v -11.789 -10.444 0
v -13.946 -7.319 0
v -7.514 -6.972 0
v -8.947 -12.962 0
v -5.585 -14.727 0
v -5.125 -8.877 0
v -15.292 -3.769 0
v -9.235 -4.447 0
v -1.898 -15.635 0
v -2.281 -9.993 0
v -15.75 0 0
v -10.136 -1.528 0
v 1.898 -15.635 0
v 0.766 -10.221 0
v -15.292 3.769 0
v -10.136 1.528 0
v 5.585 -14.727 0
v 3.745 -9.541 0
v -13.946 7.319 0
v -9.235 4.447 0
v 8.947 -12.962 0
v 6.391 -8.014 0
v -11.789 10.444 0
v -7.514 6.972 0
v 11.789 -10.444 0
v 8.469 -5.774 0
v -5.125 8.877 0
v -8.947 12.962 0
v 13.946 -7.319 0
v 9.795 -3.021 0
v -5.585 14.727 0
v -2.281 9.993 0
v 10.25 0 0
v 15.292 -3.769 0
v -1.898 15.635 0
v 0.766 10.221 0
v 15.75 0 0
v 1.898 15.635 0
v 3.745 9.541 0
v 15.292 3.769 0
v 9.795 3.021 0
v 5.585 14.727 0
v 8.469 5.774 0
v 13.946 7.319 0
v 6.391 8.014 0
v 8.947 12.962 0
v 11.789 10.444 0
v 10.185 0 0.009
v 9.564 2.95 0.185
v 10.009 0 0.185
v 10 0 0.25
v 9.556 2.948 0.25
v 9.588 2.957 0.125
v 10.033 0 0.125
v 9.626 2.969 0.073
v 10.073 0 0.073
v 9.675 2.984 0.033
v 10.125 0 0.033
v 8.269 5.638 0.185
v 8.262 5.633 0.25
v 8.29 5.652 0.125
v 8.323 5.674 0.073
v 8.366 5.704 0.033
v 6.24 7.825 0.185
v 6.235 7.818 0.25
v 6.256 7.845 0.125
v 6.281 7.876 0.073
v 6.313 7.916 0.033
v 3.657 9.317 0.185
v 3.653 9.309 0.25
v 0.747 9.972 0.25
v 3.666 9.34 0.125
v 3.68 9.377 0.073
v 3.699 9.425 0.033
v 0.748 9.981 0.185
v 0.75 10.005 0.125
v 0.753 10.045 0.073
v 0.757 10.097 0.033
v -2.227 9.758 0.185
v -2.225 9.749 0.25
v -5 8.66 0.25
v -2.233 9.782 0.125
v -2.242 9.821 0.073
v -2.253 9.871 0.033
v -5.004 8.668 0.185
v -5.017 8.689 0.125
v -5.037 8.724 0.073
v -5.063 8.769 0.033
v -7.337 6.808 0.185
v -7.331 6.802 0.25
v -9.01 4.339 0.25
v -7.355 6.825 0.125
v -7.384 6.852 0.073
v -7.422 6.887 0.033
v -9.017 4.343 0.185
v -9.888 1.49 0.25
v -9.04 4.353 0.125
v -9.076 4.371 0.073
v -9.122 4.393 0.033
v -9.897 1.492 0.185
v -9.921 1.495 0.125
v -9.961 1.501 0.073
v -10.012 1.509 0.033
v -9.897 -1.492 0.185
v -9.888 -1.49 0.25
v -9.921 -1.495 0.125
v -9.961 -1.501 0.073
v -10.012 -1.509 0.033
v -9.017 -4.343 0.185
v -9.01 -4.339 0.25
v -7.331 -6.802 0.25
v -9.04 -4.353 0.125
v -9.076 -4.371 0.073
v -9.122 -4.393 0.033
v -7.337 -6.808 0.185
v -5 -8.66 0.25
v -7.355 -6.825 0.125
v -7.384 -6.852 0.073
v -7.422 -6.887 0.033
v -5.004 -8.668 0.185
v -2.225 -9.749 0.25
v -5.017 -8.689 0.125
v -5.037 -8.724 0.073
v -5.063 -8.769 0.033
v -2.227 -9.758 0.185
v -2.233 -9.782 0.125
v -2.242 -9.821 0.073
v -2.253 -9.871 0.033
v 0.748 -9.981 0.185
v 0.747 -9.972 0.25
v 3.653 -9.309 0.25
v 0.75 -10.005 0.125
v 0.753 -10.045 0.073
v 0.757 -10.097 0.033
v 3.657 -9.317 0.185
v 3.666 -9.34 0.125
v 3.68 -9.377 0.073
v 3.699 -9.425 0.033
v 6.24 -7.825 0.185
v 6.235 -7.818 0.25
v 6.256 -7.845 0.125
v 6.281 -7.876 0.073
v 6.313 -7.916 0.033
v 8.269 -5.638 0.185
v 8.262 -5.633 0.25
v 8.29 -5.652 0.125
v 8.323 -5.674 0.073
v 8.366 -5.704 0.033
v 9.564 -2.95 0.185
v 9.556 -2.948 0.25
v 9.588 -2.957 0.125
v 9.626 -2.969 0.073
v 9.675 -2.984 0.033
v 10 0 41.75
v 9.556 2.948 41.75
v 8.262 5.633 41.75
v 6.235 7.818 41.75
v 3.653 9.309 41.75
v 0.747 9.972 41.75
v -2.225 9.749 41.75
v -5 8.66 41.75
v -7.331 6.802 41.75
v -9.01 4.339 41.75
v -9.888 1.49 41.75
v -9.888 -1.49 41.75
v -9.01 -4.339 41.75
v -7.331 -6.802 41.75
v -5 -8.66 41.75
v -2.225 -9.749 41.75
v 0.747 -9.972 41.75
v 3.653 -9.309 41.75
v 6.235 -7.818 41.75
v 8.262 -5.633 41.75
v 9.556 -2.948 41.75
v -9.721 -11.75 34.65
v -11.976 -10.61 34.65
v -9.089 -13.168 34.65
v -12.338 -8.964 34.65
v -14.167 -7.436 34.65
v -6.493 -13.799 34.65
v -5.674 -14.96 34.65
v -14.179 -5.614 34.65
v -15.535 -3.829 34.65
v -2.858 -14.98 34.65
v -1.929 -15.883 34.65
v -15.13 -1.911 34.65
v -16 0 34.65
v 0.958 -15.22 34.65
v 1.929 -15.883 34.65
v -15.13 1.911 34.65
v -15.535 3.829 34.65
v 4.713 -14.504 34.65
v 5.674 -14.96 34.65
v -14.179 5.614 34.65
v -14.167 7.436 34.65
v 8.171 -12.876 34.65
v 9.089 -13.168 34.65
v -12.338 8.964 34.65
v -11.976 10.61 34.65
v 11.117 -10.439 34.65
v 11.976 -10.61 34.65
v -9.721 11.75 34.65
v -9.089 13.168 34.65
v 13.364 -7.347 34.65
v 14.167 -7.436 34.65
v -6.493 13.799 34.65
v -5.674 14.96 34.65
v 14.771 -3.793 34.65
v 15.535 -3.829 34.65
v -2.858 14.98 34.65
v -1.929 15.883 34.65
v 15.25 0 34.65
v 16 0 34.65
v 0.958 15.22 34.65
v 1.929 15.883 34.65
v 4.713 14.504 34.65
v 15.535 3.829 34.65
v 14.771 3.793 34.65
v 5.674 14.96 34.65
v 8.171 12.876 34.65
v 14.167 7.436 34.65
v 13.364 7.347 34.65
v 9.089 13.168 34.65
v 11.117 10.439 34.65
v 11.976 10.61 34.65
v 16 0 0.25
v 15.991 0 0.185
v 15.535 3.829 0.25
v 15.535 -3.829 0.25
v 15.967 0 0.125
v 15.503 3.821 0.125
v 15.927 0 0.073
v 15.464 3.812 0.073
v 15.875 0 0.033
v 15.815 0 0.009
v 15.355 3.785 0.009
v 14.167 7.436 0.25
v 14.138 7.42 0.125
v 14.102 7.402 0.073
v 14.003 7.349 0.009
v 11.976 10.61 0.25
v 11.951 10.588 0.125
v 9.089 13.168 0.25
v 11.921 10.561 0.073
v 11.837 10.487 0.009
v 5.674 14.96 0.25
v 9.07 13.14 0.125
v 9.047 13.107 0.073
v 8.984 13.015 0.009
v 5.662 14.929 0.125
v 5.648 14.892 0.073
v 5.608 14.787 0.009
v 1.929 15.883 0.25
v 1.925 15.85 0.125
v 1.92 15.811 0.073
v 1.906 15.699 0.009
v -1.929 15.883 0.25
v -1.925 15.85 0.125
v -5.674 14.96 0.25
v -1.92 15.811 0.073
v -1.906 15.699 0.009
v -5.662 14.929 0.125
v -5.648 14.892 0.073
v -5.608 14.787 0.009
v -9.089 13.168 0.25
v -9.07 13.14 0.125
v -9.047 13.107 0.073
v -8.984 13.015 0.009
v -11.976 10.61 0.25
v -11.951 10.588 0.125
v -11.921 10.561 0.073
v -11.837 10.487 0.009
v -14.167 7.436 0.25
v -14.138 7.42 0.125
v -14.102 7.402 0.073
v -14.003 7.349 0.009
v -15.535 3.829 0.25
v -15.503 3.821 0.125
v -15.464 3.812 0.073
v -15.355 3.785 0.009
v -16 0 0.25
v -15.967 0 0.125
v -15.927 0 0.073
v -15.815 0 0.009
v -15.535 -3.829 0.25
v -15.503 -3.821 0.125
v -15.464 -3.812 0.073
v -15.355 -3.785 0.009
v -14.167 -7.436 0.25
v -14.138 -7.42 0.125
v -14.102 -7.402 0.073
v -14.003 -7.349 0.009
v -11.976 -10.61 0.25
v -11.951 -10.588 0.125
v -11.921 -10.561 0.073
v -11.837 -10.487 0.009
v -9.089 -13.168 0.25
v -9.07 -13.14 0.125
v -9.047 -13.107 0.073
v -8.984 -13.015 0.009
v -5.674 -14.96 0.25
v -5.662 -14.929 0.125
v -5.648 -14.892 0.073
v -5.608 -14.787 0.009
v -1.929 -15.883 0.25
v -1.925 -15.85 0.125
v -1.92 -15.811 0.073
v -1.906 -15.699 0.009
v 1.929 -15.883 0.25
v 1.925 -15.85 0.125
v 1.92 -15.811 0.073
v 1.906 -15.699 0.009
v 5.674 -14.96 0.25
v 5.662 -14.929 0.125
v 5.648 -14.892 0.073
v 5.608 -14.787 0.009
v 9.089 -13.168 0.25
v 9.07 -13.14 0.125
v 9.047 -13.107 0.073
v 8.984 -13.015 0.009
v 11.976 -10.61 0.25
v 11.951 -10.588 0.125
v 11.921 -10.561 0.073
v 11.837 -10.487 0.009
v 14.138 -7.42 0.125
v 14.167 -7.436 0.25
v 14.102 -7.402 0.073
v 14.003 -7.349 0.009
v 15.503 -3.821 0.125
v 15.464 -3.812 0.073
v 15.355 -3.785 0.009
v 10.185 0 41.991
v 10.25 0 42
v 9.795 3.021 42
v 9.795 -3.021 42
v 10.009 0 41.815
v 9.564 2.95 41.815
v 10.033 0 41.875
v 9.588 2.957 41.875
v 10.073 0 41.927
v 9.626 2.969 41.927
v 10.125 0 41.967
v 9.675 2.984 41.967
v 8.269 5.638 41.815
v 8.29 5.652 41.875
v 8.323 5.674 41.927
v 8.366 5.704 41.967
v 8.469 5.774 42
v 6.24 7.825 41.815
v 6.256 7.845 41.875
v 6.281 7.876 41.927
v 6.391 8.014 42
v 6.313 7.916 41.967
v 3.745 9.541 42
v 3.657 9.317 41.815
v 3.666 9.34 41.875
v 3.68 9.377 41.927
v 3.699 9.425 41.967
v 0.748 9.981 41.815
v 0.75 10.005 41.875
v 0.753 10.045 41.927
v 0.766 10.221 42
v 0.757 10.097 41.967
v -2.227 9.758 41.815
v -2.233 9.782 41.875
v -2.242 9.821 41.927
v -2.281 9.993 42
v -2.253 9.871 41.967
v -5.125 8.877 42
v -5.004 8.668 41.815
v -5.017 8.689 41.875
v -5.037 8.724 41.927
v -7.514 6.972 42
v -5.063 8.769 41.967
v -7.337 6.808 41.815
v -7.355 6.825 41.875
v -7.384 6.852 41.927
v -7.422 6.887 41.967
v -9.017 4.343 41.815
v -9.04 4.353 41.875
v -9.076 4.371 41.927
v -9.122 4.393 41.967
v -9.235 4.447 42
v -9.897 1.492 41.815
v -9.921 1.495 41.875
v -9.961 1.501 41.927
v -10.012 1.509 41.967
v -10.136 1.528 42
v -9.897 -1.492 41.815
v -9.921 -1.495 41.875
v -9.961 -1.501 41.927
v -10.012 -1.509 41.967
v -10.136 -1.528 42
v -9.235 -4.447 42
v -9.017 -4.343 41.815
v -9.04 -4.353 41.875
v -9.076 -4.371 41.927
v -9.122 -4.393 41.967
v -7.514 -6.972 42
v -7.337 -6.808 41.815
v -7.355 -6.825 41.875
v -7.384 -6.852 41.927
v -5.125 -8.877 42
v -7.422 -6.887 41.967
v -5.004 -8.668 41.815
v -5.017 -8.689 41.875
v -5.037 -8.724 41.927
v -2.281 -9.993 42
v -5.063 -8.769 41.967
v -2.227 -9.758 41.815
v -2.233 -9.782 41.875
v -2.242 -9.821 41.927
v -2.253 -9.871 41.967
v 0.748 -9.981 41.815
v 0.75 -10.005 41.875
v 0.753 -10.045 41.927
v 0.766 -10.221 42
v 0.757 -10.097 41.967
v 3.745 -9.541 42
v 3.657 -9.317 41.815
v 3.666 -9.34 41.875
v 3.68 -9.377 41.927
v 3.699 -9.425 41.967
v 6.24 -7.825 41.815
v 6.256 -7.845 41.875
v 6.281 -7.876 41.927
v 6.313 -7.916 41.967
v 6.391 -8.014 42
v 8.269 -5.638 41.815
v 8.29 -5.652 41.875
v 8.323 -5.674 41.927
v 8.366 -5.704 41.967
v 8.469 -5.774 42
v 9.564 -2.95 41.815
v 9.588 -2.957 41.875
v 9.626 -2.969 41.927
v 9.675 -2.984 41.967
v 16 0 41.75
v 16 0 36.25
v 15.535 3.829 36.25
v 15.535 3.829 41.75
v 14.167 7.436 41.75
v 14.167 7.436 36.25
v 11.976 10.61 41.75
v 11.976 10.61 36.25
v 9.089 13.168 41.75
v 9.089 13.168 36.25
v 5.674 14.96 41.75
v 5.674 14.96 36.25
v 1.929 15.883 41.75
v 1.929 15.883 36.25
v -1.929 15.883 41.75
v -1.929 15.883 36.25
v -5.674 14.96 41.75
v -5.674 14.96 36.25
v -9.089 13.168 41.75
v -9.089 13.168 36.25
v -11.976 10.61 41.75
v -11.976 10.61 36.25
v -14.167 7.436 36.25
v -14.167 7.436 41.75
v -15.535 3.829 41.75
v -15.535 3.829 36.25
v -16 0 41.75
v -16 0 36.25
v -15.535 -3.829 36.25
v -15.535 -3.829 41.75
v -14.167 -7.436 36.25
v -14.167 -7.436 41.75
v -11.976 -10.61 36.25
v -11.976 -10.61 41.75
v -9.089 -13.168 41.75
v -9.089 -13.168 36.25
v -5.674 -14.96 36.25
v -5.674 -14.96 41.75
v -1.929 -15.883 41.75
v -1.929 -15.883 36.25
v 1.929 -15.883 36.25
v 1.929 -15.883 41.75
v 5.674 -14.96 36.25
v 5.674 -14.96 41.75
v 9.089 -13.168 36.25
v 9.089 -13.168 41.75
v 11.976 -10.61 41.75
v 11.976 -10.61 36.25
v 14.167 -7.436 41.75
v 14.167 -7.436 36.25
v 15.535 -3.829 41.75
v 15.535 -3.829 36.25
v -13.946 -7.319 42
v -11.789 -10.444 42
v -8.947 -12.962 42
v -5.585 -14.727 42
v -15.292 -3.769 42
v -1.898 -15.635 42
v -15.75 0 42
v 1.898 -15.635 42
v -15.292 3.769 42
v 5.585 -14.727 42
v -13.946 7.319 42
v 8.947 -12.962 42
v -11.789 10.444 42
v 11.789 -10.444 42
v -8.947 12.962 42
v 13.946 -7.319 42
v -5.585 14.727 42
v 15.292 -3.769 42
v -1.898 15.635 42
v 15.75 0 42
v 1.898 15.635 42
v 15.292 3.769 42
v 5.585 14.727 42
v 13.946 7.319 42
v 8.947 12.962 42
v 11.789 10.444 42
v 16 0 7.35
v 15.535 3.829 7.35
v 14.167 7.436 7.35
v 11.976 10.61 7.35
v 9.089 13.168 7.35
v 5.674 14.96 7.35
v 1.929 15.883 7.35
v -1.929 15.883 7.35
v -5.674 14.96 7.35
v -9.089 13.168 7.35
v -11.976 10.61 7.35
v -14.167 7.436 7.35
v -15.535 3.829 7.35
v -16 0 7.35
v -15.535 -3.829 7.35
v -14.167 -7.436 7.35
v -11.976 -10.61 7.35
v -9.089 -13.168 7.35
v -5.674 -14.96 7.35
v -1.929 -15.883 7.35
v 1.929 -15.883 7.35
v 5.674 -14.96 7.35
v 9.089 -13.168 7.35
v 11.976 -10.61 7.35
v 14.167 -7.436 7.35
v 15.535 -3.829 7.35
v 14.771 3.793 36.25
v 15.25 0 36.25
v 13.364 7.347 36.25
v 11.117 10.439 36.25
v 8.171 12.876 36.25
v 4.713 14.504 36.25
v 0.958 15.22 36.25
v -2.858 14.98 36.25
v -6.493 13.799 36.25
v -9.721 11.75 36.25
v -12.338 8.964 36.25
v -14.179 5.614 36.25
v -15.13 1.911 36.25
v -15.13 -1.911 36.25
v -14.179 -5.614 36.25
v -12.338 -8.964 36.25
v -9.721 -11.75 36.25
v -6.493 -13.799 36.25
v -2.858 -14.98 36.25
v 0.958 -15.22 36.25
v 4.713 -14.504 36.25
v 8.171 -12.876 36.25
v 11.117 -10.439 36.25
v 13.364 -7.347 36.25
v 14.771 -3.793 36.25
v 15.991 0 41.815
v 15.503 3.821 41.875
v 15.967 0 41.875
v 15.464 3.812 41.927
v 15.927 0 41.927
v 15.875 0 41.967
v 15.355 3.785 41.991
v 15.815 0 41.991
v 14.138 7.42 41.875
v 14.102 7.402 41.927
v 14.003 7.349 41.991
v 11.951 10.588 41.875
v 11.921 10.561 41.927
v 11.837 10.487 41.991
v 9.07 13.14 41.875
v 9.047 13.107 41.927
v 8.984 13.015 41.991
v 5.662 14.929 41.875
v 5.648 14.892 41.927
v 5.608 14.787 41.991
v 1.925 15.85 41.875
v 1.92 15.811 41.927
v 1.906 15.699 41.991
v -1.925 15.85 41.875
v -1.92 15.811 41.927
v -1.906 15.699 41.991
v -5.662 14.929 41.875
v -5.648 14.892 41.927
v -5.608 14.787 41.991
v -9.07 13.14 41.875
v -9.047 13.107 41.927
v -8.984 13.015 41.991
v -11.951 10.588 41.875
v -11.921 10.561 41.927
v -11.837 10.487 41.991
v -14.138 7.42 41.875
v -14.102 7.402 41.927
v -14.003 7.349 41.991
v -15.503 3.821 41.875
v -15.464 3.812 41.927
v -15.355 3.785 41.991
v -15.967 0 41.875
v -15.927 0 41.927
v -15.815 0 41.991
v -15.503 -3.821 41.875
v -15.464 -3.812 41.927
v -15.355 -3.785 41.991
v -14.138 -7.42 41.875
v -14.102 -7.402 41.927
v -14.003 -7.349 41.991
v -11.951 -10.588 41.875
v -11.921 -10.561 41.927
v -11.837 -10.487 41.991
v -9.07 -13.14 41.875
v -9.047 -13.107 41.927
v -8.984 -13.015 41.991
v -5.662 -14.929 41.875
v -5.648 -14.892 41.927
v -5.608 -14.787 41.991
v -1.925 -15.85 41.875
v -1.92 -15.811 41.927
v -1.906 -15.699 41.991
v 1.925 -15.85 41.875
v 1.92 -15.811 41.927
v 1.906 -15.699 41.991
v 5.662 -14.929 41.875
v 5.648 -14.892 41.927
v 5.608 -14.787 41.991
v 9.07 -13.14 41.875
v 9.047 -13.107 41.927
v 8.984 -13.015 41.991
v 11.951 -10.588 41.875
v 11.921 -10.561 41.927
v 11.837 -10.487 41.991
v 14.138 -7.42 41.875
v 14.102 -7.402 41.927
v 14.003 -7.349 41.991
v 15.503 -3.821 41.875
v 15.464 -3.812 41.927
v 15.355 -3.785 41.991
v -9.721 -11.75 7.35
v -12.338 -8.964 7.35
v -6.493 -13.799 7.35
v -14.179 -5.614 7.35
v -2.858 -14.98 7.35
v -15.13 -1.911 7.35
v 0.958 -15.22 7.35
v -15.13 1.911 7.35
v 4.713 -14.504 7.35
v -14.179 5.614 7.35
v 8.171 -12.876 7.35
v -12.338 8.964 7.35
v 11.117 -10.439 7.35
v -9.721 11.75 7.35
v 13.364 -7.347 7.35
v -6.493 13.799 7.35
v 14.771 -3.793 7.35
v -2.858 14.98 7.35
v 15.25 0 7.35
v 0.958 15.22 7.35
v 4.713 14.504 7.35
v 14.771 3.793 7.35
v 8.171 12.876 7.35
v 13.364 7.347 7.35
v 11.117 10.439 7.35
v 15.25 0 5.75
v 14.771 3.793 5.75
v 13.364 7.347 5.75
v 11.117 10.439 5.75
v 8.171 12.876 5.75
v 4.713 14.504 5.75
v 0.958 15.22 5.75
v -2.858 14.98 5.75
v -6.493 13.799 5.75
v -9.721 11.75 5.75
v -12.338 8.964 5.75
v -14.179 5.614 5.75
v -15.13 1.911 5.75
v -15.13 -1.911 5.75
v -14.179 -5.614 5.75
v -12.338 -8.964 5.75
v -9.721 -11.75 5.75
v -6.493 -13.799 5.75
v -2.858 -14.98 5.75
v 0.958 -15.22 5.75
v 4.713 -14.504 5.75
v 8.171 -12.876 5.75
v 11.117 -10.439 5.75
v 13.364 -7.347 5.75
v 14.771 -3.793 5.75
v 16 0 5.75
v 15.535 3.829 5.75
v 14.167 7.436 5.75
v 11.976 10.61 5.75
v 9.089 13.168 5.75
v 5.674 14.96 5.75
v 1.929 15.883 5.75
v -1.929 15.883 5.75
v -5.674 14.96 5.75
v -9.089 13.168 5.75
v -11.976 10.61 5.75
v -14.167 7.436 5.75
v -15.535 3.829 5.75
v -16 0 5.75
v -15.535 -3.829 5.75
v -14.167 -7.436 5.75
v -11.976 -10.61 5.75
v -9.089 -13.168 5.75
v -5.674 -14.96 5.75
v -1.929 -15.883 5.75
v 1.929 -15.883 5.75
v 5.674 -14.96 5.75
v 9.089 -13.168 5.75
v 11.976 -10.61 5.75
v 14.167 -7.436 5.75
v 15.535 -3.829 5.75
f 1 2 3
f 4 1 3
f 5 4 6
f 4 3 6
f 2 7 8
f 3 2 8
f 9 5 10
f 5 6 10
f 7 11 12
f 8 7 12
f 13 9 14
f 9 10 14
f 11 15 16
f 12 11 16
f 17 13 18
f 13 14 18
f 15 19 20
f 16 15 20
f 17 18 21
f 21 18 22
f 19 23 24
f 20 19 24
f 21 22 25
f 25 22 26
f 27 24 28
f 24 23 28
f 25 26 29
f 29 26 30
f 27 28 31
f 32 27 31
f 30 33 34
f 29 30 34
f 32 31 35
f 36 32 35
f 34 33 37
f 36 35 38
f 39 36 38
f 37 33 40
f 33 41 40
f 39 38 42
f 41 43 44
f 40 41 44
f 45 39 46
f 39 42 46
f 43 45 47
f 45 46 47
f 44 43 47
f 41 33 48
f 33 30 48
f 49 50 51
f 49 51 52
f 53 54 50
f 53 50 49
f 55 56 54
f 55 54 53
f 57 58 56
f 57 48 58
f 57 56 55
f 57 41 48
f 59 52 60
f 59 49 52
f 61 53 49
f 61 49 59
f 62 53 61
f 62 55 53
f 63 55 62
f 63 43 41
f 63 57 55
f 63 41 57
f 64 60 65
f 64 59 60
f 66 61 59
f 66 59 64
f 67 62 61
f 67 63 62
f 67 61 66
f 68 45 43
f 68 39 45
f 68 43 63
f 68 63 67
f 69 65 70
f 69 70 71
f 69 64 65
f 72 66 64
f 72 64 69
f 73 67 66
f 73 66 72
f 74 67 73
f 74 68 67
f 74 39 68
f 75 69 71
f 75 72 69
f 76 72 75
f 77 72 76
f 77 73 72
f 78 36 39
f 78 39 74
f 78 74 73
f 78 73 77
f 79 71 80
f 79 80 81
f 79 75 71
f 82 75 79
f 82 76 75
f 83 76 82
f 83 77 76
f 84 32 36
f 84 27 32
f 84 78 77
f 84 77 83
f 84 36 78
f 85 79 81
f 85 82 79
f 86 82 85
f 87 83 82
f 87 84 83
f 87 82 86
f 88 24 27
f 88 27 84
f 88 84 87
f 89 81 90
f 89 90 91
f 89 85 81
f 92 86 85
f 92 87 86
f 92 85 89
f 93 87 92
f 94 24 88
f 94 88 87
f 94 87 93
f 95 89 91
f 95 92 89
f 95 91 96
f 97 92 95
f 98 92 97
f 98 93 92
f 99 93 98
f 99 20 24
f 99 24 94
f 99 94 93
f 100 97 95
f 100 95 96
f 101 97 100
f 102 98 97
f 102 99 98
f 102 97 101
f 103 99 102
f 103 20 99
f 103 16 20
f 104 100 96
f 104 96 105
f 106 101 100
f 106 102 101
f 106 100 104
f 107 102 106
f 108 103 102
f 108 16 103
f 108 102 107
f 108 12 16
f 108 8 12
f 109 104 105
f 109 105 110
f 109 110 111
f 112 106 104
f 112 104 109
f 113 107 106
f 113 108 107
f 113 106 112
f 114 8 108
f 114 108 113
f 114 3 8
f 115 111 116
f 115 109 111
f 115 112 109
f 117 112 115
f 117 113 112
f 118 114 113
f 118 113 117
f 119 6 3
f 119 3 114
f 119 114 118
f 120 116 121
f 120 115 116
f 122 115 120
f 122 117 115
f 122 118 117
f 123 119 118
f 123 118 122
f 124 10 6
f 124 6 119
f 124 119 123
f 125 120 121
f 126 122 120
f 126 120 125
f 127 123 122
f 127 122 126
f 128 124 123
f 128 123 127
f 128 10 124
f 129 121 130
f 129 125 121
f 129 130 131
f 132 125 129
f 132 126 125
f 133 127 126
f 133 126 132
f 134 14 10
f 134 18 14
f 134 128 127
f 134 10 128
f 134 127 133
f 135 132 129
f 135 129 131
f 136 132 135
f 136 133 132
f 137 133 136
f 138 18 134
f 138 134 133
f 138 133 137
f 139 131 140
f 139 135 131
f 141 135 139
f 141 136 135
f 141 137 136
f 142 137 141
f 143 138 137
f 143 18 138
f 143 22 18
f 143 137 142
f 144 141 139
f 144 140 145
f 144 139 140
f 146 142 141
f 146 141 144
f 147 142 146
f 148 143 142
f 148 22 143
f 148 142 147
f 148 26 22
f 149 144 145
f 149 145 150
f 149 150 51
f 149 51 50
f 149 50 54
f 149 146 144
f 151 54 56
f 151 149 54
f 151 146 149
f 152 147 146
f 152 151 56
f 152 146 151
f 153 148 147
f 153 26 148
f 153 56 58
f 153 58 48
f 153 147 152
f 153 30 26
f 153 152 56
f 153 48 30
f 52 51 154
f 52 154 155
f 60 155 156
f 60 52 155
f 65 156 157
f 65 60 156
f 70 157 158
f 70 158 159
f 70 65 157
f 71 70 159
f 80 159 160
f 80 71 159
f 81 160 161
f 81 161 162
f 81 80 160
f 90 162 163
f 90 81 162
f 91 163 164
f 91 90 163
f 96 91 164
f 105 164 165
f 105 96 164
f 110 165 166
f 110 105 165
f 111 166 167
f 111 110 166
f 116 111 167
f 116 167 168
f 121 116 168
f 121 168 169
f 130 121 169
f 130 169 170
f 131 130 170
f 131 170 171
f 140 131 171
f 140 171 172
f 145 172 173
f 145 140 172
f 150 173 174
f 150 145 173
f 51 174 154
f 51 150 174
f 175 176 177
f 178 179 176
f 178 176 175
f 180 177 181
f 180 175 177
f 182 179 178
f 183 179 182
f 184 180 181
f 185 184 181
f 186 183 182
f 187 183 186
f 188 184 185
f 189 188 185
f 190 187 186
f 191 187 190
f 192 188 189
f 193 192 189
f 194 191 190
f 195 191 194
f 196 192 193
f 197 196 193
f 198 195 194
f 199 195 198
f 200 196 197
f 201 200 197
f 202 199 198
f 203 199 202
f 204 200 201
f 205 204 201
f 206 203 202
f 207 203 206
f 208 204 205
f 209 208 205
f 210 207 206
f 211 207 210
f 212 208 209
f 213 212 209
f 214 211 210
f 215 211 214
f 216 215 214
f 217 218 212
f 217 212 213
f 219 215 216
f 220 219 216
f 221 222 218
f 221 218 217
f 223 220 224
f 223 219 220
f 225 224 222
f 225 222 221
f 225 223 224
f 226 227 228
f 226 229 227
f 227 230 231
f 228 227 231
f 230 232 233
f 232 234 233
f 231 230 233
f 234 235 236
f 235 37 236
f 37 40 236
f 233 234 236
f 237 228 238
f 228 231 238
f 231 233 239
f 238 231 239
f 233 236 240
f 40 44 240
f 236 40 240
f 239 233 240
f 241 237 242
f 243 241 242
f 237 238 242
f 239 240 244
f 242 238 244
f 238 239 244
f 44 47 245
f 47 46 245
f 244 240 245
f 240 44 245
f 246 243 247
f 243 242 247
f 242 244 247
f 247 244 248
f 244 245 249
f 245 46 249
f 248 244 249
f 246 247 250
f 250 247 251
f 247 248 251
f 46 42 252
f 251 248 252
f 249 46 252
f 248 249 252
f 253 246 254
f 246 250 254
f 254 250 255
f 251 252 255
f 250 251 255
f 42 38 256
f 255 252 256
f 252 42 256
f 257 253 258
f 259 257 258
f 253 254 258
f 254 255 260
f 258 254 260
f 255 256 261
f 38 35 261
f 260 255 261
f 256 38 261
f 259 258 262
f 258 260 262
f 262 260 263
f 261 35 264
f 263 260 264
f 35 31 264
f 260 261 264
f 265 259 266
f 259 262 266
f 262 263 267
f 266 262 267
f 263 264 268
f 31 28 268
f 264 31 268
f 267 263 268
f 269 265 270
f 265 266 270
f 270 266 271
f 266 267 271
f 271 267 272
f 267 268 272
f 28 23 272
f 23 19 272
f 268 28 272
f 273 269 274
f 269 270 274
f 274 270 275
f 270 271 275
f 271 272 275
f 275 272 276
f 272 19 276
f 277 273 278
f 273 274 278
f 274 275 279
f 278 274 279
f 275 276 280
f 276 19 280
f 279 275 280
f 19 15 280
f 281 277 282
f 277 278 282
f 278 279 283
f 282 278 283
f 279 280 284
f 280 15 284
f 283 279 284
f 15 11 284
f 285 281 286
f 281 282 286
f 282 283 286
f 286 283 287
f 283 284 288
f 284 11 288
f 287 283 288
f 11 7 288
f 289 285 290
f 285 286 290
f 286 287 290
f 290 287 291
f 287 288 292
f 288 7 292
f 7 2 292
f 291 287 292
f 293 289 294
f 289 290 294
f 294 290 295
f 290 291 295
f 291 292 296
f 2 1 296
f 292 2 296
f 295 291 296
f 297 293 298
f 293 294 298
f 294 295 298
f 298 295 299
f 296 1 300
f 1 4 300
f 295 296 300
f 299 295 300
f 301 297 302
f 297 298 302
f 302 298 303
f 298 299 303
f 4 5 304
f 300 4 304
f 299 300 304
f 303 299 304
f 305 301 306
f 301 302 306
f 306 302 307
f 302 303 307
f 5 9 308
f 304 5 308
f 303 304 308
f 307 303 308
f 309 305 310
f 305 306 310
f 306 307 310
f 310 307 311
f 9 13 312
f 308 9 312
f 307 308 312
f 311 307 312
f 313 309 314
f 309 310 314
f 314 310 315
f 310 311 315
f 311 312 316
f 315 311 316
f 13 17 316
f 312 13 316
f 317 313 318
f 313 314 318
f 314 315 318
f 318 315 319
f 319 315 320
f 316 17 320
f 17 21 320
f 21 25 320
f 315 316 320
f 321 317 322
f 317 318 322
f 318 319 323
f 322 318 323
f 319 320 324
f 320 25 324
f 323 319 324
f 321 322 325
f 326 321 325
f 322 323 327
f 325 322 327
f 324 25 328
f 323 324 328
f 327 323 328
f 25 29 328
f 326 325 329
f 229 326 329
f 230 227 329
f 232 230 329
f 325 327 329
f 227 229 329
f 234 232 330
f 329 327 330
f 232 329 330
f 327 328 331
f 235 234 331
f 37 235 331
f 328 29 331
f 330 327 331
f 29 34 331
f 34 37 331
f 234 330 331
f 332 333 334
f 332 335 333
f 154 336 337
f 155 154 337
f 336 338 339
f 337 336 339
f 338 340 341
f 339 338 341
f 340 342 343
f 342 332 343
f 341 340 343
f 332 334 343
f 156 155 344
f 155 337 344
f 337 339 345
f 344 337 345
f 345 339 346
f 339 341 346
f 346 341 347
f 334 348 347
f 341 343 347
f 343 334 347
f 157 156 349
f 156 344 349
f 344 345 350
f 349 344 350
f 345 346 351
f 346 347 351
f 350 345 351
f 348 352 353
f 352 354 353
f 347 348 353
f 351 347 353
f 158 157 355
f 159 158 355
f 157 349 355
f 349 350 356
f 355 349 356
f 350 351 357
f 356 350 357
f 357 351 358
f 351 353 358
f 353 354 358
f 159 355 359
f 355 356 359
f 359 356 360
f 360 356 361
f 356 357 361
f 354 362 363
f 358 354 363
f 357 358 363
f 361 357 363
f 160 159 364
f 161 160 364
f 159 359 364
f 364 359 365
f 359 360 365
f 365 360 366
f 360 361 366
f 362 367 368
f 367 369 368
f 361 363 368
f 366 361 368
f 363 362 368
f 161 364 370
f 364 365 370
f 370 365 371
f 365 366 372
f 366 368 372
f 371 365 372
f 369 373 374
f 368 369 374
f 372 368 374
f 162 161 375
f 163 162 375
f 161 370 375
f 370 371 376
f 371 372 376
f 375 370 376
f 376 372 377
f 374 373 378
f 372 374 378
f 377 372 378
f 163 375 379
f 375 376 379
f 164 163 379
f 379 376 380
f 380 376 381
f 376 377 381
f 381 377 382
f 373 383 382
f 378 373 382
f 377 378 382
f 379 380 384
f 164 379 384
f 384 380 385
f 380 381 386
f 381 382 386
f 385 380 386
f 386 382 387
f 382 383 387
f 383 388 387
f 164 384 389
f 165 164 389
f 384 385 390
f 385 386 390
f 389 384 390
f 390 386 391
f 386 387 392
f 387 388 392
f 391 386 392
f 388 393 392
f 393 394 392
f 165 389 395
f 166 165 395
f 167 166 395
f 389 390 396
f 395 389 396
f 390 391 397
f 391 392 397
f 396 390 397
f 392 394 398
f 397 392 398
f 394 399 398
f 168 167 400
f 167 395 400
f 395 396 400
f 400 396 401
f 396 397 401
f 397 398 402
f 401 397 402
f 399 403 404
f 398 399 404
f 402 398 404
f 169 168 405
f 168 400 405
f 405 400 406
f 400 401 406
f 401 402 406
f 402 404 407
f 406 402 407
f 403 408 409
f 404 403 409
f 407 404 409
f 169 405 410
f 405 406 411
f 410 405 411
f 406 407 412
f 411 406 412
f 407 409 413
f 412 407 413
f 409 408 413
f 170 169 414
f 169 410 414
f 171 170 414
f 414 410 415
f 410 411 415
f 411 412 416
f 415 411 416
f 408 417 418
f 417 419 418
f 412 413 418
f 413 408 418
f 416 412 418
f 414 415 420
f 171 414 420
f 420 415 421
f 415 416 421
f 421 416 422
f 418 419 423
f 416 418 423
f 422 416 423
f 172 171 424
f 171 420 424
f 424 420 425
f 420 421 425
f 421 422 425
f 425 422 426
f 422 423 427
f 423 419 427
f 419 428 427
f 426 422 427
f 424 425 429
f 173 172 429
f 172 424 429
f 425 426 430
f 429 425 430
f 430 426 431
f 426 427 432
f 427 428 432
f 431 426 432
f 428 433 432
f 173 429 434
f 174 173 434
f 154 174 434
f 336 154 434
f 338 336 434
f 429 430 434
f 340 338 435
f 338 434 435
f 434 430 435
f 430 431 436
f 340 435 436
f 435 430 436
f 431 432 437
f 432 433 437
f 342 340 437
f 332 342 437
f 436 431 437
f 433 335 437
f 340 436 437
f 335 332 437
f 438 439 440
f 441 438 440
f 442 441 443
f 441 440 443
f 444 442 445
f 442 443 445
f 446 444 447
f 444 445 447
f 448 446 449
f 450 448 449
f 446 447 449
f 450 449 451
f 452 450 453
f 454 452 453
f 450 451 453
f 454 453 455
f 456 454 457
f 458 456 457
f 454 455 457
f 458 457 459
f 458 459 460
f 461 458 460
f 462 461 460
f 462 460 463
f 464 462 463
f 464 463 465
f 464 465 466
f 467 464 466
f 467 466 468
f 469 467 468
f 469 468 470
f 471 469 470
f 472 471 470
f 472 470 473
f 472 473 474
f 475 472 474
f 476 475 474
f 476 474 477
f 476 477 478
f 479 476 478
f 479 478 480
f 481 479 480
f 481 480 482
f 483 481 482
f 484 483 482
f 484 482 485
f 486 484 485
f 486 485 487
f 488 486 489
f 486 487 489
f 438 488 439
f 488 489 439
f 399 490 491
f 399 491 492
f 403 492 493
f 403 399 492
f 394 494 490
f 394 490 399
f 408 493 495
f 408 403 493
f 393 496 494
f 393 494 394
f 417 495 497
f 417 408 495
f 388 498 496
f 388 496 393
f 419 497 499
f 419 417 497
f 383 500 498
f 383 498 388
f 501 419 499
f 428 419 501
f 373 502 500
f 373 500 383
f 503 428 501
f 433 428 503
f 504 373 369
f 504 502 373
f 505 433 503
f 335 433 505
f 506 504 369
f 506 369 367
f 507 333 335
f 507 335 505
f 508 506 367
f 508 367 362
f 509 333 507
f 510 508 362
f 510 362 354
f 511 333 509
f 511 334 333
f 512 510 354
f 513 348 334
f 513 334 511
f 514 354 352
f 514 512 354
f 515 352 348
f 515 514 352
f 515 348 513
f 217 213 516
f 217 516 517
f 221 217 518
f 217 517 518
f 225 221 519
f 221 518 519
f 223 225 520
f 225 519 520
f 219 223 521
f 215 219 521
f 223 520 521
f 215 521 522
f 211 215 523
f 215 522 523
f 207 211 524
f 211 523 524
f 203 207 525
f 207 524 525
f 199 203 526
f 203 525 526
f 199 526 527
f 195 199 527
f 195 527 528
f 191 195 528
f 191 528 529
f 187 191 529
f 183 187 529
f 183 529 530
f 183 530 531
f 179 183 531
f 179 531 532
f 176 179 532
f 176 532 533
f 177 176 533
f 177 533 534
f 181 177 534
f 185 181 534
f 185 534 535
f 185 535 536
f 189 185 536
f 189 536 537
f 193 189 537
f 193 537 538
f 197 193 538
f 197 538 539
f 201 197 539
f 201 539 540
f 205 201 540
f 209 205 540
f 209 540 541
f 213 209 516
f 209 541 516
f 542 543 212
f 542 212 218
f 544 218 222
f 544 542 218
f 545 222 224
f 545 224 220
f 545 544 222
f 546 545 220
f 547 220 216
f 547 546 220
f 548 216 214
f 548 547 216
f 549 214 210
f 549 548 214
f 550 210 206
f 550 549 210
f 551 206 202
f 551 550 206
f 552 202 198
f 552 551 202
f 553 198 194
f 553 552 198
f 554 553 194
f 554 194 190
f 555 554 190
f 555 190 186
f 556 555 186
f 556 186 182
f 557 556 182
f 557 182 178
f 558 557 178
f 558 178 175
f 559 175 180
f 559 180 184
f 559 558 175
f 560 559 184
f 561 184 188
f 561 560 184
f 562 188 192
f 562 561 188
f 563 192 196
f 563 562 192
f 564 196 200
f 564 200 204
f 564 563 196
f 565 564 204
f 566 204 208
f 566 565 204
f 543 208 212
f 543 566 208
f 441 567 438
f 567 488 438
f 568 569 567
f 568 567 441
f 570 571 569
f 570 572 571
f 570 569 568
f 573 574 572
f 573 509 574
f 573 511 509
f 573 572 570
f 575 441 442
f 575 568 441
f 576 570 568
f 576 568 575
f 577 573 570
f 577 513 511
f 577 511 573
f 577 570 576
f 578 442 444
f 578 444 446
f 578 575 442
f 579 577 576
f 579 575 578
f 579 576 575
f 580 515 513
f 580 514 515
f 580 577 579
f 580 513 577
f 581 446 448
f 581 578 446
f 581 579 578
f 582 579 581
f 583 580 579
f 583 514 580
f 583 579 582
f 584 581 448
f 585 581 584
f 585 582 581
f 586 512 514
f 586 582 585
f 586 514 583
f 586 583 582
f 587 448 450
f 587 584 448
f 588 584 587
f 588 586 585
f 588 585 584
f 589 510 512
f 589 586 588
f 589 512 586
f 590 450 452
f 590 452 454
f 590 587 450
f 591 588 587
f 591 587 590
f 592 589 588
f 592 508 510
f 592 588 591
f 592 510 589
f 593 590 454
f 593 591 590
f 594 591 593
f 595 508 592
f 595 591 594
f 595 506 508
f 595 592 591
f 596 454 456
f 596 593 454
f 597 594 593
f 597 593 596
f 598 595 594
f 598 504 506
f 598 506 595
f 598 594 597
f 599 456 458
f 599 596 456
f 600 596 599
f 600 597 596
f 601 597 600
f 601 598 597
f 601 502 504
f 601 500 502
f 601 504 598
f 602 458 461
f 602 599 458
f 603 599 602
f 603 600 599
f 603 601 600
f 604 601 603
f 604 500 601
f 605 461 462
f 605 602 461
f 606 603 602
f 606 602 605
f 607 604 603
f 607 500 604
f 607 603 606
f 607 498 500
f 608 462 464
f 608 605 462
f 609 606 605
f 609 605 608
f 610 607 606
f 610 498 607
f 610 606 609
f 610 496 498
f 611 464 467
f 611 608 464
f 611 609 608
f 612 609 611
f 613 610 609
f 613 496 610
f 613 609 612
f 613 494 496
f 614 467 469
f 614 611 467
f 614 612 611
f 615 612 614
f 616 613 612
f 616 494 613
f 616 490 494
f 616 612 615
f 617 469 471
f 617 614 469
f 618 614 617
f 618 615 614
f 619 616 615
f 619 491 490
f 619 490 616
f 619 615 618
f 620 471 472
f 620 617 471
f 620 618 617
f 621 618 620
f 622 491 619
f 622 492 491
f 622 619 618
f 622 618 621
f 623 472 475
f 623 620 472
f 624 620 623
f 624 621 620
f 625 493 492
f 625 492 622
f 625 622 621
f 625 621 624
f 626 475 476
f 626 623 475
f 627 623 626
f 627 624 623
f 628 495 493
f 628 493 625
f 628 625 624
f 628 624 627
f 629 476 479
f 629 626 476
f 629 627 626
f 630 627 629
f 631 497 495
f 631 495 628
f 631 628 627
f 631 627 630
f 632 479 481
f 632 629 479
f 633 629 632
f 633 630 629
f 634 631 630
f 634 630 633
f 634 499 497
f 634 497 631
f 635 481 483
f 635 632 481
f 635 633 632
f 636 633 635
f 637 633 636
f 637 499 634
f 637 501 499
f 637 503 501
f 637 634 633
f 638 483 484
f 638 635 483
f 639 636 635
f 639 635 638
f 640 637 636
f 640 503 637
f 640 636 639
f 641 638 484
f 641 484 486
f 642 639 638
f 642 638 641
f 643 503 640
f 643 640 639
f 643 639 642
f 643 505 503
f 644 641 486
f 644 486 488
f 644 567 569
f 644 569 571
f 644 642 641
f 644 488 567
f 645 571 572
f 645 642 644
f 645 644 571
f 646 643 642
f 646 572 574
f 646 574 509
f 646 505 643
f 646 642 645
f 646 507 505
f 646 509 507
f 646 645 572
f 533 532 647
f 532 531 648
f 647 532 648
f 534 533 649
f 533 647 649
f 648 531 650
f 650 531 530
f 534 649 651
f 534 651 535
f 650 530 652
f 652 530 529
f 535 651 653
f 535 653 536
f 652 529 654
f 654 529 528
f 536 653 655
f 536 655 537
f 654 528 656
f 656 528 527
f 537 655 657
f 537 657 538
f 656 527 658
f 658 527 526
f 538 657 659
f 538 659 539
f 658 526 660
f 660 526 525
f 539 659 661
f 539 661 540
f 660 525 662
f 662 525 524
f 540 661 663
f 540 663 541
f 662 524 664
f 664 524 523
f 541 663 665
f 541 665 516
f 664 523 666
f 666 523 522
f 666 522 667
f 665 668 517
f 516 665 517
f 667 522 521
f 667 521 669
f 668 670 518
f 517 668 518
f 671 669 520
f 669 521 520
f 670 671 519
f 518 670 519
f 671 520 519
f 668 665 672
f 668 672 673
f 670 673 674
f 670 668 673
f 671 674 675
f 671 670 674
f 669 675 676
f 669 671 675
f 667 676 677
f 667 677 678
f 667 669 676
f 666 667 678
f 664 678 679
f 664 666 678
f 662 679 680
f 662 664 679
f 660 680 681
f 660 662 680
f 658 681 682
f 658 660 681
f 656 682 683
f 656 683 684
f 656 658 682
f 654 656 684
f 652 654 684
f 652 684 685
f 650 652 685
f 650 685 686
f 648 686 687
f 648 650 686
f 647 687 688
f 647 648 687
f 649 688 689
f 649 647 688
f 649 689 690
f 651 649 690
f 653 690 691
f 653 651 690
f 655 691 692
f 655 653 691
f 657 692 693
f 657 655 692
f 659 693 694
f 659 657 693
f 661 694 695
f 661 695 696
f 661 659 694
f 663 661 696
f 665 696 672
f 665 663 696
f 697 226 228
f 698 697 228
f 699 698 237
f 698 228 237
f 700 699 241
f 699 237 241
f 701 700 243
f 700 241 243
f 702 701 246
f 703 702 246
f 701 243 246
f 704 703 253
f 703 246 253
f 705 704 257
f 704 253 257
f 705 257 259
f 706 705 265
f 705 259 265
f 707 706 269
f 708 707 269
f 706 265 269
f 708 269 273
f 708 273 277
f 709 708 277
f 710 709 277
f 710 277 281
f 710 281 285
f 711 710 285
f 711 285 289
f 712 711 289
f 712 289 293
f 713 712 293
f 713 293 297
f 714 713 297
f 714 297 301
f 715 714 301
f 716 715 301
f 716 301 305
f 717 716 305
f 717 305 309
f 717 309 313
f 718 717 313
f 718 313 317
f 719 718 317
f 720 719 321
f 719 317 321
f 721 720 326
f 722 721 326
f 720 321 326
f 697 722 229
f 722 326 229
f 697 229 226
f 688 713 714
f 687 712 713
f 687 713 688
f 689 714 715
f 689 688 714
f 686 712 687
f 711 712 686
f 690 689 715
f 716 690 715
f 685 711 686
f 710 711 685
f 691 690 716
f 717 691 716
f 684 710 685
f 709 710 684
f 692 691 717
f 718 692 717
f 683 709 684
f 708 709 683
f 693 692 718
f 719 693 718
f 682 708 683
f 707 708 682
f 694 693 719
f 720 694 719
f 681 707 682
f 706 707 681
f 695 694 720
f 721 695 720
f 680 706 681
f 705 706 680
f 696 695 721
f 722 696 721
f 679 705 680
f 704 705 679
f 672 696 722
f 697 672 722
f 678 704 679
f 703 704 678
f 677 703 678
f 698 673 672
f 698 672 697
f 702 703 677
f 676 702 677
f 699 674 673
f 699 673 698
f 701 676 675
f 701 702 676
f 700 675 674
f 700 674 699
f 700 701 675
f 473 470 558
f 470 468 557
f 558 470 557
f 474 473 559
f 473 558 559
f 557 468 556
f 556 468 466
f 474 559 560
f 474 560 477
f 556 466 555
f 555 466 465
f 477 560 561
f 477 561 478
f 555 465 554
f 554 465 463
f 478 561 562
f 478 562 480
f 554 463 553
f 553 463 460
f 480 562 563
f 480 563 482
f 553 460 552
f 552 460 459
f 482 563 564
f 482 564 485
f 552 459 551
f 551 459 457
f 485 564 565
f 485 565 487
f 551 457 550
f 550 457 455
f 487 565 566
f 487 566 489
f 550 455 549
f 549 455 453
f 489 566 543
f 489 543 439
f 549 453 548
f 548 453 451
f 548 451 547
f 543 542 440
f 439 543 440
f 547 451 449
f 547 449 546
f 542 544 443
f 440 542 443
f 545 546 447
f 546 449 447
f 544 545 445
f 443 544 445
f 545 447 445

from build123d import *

# Parameters (mm, degrees)
F0_R     = 16
F0_R_2   = 10
F1_DEPTH = 42
F2_R     = 0.25
F4_START = -5.75
F3_R     = 16
F3_R_2   = 15.25
F4_DEPTH = 1.6
F5_START = -34.65
F5_DEPTH = 1.6


with BuildPart() as f1:
    # F0 (on Top) → F1 (new body)
    with BuildSketch(Plane.XY):
        Circle(F0_R)
        Circle(F0_R_2, mode=Mode.SUBTRACT)
    extrude(amount=F1_DEPTH)

    # F2
    f2_edges = [f1.edges().sort_by_distance(p)[0] for p in [
        (-16, 0, 42),
        (-10, 0, 42),
        (-16, 0, 0),
        (-10, 0, 0),
    ]]
    fillet(f2_edges, radius=F2_R)

    # F3 (on face) → F4 (cut)
    with BuildSketch(Plane.XY.offset(42).offset(F4_START)):
        Circle(F3_R)
        Circle(F3_R_2, mode=Mode.SUBTRACT)
    extrude(amount=-F4_DEPTH, mode=Mode.SUBTRACT)

    # F3 (on face) → F5 (cut)
    with BuildSketch(Plane.XY.offset(42).offset(F5_START)):
        Circle(F3_R)
        Circle(F3_R_2, mode=Mode.SUBTRACT)
    extrude(amount=-F5_DEPTH, mode=Mode.SUBTRACT)


solid = f1.part
